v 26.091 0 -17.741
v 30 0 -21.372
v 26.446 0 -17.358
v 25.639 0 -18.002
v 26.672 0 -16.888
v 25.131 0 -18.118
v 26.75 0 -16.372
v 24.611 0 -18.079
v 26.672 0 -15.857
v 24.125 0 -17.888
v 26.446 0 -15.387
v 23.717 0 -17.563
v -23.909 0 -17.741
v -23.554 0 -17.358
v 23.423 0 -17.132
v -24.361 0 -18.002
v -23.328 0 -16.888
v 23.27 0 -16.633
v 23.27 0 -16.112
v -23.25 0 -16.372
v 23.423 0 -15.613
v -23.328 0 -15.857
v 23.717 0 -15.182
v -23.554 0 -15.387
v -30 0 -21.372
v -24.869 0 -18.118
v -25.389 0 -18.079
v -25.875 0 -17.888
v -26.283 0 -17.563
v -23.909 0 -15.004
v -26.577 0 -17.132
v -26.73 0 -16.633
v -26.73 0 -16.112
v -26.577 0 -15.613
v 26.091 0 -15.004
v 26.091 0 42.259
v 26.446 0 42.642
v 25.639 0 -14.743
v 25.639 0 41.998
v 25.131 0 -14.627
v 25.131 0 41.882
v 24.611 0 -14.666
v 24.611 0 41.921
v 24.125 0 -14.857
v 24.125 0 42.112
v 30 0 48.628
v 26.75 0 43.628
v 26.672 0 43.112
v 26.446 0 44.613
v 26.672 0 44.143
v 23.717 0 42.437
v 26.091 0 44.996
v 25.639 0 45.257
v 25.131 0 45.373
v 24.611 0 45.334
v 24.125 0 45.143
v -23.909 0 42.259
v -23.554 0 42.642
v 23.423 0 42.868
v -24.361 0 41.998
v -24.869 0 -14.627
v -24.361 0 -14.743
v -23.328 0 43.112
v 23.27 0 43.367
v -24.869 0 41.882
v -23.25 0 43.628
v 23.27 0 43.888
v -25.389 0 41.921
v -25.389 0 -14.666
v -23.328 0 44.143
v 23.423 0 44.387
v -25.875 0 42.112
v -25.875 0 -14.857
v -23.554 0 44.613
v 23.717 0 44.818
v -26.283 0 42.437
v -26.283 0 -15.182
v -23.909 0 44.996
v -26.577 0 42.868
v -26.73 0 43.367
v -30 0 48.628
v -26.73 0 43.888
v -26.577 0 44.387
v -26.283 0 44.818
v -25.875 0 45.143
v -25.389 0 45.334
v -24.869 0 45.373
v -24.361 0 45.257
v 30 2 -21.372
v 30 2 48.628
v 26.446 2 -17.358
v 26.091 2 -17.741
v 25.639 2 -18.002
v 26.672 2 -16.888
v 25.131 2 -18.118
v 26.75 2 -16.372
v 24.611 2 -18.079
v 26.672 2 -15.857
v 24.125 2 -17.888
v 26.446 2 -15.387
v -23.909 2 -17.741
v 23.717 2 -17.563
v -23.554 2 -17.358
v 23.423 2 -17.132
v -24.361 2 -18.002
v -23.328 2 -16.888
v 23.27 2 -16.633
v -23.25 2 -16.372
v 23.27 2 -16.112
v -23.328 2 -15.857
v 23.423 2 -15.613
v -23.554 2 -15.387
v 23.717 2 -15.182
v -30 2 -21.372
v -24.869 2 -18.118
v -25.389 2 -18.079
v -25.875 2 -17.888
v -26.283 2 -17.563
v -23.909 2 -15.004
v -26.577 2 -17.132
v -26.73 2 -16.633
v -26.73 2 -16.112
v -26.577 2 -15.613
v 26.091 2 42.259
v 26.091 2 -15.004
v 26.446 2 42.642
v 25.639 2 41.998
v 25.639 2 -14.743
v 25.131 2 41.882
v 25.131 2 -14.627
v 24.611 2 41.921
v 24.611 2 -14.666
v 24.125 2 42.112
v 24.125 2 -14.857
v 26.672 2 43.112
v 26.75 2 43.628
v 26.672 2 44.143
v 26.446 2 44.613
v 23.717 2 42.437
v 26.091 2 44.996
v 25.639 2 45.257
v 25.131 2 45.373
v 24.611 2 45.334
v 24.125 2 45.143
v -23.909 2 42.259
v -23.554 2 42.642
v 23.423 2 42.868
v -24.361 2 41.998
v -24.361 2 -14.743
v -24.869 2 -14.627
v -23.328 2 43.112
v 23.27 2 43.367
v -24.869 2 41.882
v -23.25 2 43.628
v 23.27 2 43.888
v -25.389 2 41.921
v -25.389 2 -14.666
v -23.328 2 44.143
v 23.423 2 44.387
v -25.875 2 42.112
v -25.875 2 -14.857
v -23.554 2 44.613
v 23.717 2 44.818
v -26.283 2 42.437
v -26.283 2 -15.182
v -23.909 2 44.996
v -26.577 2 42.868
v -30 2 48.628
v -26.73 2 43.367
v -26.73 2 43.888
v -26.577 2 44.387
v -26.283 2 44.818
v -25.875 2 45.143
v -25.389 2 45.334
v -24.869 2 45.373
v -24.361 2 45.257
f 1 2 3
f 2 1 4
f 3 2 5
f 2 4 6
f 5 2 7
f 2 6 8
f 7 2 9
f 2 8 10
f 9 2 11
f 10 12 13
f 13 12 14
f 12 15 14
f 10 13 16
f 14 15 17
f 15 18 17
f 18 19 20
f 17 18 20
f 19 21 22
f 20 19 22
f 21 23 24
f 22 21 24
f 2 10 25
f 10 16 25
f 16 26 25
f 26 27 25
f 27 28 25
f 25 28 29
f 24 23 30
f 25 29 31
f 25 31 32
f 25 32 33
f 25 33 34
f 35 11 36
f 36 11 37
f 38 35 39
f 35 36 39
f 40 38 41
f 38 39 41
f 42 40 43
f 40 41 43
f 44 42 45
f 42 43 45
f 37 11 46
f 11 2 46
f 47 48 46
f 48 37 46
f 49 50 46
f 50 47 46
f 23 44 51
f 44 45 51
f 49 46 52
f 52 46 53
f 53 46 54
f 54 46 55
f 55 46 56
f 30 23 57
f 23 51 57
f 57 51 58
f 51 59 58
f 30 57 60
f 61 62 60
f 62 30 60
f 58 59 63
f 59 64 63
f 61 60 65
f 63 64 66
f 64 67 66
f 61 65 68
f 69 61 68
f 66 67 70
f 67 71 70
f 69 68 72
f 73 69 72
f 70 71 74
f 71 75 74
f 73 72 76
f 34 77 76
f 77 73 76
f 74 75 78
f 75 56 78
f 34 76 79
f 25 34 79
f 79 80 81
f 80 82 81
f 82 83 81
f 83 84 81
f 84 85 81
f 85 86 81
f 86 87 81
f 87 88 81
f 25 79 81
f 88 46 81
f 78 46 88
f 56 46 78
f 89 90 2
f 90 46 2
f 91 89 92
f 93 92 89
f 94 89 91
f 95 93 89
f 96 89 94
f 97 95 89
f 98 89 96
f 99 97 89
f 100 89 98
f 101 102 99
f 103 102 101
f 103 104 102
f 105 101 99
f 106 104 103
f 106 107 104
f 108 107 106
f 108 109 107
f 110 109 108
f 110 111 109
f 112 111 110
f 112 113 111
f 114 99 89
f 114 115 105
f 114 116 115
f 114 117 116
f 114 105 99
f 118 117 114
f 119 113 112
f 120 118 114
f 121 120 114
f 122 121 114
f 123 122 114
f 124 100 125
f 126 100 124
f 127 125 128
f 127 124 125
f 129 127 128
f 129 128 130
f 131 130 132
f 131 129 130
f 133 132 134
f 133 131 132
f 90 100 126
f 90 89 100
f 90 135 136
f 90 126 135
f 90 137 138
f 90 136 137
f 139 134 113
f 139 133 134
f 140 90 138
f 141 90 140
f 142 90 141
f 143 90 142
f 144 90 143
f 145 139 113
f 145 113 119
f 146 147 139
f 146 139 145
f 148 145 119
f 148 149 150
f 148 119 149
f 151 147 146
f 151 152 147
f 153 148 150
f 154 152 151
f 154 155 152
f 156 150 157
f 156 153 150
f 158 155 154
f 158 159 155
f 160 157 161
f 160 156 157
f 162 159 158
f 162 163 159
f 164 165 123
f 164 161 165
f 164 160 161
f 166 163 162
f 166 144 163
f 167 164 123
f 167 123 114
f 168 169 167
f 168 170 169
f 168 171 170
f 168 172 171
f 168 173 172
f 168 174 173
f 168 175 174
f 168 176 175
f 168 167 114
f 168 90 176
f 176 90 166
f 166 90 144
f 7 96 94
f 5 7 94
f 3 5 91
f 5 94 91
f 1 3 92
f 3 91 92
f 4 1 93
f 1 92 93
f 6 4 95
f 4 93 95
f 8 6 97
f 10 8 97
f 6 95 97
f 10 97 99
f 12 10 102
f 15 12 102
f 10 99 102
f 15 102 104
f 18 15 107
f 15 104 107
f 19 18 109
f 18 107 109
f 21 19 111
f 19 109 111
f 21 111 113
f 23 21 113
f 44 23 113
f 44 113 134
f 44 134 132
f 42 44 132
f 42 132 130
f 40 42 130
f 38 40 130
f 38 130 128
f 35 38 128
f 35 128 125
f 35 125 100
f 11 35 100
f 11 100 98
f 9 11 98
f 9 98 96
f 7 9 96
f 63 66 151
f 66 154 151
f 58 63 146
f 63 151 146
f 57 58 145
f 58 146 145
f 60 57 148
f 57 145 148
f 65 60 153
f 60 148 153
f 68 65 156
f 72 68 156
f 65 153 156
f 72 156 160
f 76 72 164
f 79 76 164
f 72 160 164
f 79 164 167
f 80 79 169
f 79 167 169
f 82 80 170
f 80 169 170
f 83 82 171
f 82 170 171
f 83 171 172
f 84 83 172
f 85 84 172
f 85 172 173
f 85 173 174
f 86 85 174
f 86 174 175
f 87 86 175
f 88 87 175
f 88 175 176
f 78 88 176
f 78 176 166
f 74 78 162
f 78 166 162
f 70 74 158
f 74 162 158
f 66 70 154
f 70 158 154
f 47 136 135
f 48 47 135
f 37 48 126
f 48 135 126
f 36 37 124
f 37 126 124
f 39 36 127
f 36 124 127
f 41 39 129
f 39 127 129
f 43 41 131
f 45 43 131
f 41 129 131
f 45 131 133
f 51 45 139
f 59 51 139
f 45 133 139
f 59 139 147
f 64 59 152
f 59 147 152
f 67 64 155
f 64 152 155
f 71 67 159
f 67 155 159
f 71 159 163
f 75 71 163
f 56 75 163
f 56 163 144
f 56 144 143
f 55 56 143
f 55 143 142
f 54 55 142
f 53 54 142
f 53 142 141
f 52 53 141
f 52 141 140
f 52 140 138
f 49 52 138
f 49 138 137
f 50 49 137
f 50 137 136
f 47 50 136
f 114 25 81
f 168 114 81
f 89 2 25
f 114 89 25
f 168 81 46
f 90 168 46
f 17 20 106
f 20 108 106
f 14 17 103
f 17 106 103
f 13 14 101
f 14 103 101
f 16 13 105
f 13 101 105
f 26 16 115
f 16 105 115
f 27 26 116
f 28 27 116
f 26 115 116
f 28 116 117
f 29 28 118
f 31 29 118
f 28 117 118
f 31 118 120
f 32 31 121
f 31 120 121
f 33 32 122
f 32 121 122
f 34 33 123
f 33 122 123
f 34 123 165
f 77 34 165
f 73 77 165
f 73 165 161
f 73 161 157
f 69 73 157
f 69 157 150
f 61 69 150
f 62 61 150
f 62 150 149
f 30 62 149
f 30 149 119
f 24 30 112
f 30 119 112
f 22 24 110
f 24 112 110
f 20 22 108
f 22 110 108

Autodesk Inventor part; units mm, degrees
ref_plane "YZ Plane" through (0, 0, 0) normal (1, 0, 0) x (0, 1, 0)
ref_plane "XZ Plane" through (0, 0, 0) normal (0, 1, 0) x (-1, 0, 0)
ref_plane "XY Plane" through (0, 0, 0) normal (0, 0, 1) x (1, 0, 0)
sketch "Sketch1" plane through (0, 0, 0) normal (0, 1, 0) x (-1, 0, 0)
  line L0 (30, 48.6275) -> (-30, 48.6275)
  line L1 (-30, 48.6275) -> (-30, -21.3725)
  line L2 (-30, -21.3725) -> (30, -21.3725)
  line L3 (30, -21.3725) -> (30, 48.6275)
  point P0 (0, 0)
  dimension "d0" = 70
  dimension "d1" = 60
extrude "Extrusion1" add sketch "Sketch1" along normal blind 2
sketch "Sketch2" plane through (0, 2, 0) normal (0, 1, 0) x (1, 0, 0)
  line L0 (0, 0) -> (-21.5262, 0) construction
  circle A0 centre (-25, -43.6275) radius 1.75
  line L1 (-30, -48.6275) -> (30, -48.6275) projected
  line L2 (-30, 21.3725) -> (-30, -48.6275) projected
  circle A1 centre (25, -43.6275) radius 1.75
  circle A2 centre (25, 16.3725) radius 1.75
  circle A3 centre (-25, 16.3725) radius 1.75
  line L3 (30, -48.6275) -> (30, 21.3725) projected
  line L4 (30, 21.3725) -> (-30, 21.3725) projected
  dimension "d4" = 3.5
  dimension "d5" = 5
  dimension "d6" = 5
  dimension "d7" = 3.5
  dimension "d8" = 3.5
  dimension "d9" = 3.5
  dimension "d10" = 5
  dimension "d11" = 5
  dimension "d12" = 5
  dimension "d13" = 5
  dimension "d14" = 5
  dimension "d15" = 5
extrude "Extrusion2" cut sketch "Sketch2" against normal through all contours A0 | A1 | A2 | A3
properties part number "Supporto1"
